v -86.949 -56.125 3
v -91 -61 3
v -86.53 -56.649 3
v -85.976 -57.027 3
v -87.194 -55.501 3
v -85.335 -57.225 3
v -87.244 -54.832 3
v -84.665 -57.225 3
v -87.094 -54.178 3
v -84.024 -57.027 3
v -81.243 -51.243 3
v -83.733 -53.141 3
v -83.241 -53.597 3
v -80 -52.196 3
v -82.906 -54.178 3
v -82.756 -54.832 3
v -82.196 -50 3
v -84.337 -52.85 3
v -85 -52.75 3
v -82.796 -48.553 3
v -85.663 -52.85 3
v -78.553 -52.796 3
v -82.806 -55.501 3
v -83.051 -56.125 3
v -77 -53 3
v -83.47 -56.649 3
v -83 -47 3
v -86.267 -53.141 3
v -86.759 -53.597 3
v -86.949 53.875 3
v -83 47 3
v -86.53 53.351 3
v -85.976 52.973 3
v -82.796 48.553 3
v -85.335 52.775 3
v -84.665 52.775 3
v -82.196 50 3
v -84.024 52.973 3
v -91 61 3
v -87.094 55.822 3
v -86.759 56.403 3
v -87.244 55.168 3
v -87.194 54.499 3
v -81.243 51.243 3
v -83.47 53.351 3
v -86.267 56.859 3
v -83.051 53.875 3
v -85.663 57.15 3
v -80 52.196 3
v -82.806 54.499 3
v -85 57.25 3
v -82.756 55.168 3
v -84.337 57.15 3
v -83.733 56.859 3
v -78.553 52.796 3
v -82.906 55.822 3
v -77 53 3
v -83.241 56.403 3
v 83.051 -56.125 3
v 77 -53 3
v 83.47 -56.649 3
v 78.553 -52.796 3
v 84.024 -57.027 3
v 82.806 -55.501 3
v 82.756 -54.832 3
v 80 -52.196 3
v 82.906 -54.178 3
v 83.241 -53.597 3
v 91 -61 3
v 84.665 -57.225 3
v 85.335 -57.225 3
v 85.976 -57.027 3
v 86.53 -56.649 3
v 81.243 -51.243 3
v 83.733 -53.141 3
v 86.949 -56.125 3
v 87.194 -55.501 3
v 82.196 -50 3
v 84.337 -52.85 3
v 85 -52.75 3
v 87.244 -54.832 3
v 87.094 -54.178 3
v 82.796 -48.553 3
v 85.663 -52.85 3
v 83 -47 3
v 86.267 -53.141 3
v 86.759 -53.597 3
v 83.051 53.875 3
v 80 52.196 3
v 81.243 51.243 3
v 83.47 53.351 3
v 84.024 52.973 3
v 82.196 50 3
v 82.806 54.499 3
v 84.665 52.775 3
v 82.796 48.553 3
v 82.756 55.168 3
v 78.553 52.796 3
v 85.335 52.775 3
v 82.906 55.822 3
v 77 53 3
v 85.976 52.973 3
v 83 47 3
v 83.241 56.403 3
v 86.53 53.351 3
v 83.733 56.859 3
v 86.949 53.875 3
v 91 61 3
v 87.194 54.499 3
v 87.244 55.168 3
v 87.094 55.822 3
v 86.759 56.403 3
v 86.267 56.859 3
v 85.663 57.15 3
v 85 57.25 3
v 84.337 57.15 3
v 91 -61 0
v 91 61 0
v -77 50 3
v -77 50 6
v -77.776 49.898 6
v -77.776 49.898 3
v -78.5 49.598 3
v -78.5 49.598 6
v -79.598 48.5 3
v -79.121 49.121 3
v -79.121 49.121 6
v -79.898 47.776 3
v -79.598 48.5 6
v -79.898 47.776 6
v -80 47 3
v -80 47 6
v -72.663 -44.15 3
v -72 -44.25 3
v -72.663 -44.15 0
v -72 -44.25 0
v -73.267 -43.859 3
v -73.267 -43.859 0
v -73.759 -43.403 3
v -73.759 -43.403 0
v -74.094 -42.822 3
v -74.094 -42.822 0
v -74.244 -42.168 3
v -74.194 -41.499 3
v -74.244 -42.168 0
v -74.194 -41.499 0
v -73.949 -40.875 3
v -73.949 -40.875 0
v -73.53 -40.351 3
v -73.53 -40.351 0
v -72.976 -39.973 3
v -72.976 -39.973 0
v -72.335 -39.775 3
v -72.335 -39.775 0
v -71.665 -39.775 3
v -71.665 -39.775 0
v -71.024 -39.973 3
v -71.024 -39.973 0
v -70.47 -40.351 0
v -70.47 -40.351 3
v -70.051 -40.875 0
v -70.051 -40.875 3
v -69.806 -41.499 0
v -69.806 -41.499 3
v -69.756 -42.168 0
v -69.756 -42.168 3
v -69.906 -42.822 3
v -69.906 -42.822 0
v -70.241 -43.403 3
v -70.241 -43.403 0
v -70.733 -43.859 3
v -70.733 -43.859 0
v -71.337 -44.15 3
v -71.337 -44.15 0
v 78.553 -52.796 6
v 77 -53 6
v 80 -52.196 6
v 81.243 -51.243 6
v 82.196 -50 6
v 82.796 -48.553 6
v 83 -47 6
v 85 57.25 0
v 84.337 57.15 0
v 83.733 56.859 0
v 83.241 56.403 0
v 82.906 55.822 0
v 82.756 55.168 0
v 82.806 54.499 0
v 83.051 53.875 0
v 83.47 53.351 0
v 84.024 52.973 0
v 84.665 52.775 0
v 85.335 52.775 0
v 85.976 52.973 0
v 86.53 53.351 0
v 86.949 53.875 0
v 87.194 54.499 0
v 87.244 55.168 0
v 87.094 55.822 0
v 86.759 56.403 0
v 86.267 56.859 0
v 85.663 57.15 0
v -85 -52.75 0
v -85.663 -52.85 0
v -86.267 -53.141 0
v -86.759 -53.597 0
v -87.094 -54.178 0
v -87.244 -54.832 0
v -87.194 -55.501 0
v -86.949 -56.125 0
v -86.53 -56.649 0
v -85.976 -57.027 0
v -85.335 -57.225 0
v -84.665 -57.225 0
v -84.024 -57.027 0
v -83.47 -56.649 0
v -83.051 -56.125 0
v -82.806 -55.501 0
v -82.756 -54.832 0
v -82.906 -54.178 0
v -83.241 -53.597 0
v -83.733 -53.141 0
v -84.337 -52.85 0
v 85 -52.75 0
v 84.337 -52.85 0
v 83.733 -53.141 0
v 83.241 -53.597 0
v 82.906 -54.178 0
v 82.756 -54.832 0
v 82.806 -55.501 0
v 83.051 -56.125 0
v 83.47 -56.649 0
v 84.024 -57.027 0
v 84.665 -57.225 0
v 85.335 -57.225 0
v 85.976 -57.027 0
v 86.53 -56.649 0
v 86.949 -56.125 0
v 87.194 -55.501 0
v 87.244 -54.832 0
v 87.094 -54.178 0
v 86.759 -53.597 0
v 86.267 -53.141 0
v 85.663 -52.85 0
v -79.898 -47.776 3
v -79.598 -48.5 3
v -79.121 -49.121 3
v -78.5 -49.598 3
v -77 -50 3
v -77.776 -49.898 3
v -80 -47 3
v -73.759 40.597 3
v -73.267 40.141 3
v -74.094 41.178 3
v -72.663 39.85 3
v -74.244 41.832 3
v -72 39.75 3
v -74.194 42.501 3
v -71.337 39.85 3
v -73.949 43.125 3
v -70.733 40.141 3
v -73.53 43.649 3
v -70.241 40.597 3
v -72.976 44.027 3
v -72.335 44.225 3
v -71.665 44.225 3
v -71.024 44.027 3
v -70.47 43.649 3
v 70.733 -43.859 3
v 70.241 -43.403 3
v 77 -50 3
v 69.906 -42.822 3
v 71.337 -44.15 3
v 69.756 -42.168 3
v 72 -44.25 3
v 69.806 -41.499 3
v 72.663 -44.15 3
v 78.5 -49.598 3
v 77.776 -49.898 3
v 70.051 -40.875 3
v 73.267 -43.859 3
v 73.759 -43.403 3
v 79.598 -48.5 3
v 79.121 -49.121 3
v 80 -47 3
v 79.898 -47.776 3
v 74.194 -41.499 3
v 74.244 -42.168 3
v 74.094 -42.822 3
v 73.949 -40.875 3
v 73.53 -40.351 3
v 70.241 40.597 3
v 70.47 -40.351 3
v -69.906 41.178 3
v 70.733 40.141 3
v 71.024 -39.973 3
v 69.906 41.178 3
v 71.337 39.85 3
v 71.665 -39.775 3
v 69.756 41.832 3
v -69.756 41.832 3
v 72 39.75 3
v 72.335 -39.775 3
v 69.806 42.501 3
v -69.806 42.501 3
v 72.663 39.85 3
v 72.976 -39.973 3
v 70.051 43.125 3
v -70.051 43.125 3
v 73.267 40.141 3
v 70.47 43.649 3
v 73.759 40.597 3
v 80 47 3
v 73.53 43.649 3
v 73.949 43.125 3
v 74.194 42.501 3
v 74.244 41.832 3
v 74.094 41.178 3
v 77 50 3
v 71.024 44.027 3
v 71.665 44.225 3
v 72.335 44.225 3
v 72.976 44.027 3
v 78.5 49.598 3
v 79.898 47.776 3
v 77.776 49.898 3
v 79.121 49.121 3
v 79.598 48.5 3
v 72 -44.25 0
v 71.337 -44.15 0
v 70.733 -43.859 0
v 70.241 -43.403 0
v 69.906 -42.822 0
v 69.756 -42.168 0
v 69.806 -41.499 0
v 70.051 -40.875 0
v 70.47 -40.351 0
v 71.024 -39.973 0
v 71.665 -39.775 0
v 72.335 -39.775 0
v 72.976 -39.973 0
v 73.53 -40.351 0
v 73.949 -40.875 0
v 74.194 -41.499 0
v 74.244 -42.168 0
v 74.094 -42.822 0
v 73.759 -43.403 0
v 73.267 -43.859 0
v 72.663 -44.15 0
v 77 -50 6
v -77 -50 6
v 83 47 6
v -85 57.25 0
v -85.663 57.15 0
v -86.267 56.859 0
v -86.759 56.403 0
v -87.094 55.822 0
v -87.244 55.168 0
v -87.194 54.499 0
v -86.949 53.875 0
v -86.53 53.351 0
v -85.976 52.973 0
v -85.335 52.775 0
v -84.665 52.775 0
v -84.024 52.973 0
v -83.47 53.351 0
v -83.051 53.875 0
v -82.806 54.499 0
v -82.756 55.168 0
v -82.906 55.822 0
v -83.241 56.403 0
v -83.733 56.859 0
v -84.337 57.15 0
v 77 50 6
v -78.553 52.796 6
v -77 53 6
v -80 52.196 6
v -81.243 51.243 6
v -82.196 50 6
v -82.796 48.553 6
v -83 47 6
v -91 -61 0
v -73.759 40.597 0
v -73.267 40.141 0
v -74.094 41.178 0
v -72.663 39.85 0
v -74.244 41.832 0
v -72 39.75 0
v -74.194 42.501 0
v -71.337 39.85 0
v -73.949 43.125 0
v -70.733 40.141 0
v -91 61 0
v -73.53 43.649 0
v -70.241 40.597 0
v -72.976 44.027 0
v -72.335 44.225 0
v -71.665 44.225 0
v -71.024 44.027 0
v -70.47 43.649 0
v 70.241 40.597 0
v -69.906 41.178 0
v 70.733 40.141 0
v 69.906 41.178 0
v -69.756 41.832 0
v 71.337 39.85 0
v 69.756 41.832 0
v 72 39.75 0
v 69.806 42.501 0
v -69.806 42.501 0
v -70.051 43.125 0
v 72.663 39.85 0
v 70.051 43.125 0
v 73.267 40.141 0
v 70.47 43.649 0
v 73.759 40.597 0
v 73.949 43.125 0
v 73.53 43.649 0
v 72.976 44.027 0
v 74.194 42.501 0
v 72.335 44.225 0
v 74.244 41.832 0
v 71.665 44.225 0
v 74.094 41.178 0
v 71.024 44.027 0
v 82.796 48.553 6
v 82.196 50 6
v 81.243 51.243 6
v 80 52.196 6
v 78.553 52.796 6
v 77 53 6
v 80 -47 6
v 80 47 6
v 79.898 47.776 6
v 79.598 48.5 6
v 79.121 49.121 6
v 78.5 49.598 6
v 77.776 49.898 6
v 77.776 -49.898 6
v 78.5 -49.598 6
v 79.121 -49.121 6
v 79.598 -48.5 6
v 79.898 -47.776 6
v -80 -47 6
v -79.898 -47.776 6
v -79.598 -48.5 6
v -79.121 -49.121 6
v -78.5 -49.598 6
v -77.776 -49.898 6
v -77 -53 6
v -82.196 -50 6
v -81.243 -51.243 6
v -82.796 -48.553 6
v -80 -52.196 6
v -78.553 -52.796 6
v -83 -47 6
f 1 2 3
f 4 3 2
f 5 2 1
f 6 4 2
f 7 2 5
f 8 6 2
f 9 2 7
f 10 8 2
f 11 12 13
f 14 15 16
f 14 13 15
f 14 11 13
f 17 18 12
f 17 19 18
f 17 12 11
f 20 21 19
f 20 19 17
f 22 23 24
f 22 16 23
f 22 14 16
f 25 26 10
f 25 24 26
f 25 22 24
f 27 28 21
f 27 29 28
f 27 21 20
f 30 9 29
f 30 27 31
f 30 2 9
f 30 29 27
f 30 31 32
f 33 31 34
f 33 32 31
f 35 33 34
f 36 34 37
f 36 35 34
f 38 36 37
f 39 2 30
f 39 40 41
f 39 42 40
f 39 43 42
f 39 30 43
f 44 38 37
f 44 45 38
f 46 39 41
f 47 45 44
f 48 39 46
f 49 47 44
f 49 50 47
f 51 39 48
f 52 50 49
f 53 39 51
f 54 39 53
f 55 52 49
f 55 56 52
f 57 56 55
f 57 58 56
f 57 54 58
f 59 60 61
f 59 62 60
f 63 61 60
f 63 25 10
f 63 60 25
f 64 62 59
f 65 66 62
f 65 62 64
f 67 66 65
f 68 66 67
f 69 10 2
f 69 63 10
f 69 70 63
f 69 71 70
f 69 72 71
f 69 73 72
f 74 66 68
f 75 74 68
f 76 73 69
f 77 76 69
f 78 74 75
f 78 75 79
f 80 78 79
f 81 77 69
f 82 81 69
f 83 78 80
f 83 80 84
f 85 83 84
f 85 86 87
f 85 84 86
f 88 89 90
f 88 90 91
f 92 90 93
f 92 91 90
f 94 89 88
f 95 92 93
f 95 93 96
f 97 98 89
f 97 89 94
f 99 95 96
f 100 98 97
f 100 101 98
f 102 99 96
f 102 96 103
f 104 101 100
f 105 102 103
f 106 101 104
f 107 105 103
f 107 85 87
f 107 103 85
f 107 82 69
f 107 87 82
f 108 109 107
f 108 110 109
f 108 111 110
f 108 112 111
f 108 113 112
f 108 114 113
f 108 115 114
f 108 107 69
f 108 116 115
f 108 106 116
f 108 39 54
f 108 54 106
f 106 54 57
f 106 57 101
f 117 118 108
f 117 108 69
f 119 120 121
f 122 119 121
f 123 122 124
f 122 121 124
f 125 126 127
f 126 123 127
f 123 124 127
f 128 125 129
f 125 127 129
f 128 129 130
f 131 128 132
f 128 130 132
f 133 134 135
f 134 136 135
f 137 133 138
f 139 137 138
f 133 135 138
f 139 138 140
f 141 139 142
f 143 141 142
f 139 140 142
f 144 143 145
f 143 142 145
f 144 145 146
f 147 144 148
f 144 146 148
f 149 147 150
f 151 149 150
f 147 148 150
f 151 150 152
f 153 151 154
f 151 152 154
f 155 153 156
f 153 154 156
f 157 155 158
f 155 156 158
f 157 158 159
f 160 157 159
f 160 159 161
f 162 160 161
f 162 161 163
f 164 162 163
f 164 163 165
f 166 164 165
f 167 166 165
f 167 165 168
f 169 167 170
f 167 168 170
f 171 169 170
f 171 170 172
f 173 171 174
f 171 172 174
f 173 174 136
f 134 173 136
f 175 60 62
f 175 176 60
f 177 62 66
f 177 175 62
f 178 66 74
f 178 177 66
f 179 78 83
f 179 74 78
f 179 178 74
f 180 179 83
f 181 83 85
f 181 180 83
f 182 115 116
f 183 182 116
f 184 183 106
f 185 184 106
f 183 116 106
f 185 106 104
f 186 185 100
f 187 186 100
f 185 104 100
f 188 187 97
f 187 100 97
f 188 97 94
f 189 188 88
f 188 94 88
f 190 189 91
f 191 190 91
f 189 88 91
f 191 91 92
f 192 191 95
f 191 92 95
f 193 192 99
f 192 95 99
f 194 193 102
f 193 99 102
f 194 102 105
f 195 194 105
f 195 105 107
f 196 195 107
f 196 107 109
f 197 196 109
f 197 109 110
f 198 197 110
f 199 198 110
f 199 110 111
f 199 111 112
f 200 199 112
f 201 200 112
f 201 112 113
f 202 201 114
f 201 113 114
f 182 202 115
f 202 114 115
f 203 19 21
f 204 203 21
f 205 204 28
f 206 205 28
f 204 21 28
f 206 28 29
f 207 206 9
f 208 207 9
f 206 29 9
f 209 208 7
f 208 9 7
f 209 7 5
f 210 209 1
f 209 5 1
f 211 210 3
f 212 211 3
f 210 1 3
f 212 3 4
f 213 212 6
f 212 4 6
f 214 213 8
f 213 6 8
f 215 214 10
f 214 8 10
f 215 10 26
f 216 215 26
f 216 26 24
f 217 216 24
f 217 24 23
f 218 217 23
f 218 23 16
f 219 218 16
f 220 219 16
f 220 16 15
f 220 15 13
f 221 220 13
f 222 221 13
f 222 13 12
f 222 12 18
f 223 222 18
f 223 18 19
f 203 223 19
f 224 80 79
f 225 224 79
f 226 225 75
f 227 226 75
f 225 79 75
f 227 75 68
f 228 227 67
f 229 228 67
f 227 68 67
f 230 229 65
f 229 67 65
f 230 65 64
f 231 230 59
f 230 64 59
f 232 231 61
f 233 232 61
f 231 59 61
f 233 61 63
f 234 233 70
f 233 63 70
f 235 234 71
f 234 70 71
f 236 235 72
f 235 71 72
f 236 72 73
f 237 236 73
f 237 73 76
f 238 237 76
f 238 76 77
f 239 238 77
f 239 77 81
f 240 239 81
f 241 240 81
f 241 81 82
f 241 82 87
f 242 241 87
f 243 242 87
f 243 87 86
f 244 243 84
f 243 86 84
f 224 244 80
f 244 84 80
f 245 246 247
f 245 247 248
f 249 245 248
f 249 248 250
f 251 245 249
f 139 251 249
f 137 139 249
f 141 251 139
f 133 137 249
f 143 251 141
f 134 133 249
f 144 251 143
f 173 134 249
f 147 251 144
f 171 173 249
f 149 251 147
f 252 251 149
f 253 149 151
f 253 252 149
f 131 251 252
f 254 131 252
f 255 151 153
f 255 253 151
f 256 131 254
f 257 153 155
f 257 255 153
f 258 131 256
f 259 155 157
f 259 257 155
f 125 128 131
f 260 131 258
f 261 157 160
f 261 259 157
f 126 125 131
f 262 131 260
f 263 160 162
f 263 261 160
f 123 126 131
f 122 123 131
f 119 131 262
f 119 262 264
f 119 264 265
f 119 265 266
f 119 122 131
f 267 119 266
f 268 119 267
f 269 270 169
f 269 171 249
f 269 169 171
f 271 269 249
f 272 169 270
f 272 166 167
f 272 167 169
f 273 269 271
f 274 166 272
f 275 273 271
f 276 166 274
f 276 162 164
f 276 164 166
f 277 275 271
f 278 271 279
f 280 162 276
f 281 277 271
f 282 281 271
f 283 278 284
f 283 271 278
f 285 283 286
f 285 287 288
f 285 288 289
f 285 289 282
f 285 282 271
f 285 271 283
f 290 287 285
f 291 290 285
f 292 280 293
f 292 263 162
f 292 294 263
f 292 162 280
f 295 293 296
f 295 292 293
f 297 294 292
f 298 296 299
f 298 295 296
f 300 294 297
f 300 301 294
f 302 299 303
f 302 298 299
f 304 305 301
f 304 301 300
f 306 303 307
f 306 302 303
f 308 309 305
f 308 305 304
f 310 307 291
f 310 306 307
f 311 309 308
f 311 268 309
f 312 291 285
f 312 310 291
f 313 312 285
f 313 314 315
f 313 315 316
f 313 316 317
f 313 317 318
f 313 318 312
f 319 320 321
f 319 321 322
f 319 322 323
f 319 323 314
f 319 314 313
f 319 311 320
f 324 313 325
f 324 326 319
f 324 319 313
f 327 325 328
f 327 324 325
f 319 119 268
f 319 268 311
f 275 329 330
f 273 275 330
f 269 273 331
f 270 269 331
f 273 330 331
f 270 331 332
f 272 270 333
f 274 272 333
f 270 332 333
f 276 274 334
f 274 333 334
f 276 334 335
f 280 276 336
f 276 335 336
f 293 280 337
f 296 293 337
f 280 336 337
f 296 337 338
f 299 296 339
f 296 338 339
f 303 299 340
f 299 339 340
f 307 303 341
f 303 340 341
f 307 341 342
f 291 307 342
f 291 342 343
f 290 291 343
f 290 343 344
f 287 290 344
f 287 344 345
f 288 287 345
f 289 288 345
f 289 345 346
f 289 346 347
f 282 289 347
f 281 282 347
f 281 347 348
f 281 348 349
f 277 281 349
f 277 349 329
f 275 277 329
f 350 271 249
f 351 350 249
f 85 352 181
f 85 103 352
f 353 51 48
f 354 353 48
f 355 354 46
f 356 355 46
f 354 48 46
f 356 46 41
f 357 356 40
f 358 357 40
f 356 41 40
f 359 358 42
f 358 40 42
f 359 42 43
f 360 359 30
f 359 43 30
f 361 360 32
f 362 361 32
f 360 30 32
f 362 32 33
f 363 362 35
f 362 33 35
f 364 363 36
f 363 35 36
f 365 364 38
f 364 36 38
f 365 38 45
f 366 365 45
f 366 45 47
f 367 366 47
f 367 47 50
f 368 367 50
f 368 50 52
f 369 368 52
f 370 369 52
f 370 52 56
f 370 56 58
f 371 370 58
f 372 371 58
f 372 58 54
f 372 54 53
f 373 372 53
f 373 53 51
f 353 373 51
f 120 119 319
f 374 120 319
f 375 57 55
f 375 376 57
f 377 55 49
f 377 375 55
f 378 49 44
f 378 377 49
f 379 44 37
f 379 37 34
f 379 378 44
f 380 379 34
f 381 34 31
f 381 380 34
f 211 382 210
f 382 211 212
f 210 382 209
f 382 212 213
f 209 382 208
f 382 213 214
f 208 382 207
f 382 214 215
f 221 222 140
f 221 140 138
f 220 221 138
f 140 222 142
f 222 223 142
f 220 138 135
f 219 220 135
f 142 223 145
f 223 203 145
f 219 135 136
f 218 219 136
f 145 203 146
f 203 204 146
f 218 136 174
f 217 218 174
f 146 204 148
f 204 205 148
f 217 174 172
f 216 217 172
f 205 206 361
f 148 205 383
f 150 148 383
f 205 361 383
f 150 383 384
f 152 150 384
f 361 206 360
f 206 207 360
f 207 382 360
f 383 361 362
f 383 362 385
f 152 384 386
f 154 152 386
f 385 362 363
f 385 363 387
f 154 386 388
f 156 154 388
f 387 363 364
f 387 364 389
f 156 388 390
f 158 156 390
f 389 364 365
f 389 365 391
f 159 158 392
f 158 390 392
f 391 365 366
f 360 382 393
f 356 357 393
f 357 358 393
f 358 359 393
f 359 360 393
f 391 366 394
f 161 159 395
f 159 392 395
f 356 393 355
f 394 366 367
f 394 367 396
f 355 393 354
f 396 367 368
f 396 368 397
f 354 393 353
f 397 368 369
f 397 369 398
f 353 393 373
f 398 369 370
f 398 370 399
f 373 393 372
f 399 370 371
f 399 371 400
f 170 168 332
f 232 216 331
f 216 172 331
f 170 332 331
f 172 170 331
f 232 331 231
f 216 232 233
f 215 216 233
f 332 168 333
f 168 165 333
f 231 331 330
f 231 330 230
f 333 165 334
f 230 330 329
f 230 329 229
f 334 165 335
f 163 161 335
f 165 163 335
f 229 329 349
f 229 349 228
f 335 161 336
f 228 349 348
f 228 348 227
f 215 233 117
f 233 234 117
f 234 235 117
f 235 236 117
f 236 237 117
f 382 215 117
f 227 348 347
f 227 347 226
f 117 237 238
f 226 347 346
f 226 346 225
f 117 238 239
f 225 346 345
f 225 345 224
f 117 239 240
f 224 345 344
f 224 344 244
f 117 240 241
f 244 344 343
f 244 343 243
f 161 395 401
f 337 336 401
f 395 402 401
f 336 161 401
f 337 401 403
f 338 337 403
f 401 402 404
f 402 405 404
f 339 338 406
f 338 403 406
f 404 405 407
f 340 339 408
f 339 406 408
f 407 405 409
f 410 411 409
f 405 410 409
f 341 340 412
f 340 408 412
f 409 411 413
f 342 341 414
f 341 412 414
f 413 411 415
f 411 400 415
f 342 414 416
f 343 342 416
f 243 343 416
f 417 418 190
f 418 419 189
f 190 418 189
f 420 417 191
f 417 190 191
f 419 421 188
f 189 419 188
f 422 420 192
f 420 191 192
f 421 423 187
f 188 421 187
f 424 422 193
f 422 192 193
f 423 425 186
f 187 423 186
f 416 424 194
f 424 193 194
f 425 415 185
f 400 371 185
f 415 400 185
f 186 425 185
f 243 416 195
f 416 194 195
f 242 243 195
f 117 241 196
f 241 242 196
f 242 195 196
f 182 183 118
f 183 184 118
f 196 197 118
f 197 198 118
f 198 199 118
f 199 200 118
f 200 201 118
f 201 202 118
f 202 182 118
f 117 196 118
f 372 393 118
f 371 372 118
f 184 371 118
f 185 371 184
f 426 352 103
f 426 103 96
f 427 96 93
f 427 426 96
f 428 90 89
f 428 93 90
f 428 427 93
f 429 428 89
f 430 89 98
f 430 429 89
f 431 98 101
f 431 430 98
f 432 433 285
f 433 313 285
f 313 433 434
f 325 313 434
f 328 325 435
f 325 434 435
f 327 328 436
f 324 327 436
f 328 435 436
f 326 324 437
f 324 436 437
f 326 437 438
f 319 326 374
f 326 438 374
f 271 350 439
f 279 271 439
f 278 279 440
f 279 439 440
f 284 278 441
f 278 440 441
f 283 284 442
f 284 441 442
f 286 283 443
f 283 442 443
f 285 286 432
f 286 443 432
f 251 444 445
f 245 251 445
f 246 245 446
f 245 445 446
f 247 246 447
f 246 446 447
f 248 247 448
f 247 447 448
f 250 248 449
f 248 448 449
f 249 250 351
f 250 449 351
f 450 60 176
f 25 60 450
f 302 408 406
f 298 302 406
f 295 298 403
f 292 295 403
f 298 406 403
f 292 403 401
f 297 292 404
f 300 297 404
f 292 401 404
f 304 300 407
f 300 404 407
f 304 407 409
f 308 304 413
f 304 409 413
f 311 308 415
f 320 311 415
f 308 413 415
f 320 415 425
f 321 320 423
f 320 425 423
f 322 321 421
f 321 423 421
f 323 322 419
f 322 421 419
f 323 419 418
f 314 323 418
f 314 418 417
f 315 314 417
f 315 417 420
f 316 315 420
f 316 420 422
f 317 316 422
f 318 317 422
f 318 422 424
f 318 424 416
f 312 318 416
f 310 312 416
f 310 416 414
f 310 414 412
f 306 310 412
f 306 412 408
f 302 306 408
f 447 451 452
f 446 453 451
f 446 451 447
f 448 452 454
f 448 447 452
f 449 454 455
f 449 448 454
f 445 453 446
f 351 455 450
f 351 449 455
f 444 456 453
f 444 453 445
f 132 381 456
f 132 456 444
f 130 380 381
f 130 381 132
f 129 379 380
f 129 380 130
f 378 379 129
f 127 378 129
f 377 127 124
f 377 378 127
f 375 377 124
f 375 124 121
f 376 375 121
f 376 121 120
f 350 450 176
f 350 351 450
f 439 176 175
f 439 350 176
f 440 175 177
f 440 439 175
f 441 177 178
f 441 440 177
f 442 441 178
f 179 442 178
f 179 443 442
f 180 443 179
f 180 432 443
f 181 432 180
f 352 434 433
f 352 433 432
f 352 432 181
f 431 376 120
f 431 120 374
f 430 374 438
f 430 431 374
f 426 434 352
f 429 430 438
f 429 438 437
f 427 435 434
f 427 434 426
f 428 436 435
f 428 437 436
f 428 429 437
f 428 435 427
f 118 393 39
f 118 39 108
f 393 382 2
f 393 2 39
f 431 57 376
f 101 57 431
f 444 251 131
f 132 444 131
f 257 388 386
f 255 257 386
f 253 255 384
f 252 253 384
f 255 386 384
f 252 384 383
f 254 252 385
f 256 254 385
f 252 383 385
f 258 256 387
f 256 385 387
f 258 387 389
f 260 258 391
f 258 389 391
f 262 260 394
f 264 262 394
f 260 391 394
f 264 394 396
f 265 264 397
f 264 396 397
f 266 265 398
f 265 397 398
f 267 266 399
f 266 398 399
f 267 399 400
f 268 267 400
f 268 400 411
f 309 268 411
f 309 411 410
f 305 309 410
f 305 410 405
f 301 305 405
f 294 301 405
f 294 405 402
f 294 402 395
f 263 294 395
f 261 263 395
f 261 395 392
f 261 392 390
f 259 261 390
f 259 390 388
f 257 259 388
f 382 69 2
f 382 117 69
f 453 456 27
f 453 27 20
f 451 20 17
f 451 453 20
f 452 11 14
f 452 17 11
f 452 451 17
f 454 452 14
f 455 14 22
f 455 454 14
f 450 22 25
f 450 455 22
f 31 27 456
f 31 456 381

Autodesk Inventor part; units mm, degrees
ref_plane "YZ Plane" through (0, 0, 0) normal (1, 0, 0) x (0, 1, 0)
ref_plane "XZ Plane" through (0, 0, 0) normal (0, 1, 0) x (-1, 0, 0)
ref_plane "XY Plane" through (0, 0, 0) normal (0, 0, 1) x (1, 0, 0)
sketch "Sketch1" plane through (0, 0, 0) normal (0, 0, 1) x (1, 0, 0)
  line L0 (-83, 53) -> (83, 53) construction
  line L1 (83, 53) -> (83, -53) construction
  line L2 (83, -53) -> (-83, -53) construction
  line L3 (-83, -53) -> (-83, 53) construction
  line L4 (-83, 53) -> (83, -53) construction
  line L5 (83, 53) -> (-83, -53) construction
  line L6 (-91, 61) -> (91, 61)
  line L7 (91, 61) -> (91, -61)
  line L8 (91, -61) -> (-91, -61)
  line L9 (-91, -61) -> (-91, 61)
  line L10 (-91, 61) -> (91, -61) construction
  line L11 (-91, -61) -> (91, 61) construction
  point P0 (0, 0)
  point P1 (0, 0)
  point P2 (0, 0)
  dimension "d0" = 166
  dimension "d1" = 106
  dimension "d2" = 8
  dimension "d3" = 8
extrude "Extrusion1" add sketch "Sketch1" along normal blind 3
sketch "Sketch2" plane through (0, 0, 3) normal (0, 0, 1) x (1, 0, 0)
  line L0 (-83, 53) -> (83, 53)
  line L1 (83, 53) -> (83, -53)
  line L2 (83, -53) -> (-83, -53)
  line L3 (-83, -53) -> (-83, 53)
  line L4 (-83, 53) -> (83, -53) construction
  line L5 (83, 53) -> (-83, -53) construction
  line L6 (-80, 50) -> (80, 50)
  line L7 (80, 50) -> (80, -50)
  line L8 (80, -50) -> (-80, -50)
  line L9 (-80, -50) -> (-80, 50)
  line L10 (-80, -50) -> (80, 50) construction
  line L11 (80, -50) -> (-80, 50) construction
  point P0 (0, 0)
  point P1 (0, 0)
  point P2 (0, 0)
  dimension "d6" = 166
  dimension "d7" = 106
  dimension "d8" = 3
  dimension "d9" = 3
extrude "Extrusion2" add sketch "Sketch2" along normal blind 3
fillet "Fillet1" radius 3 4 edges at (80, 50, 4.5) (80, -50, 4.5) (-80, -50, 4.5) (-80, 50, 4.5)
fillet "Fillet2" radius 6 4 edges at (83, 53, 4.5) (83, -53, 4.5) (-83, -53, 4.5) (-83, 53, 4.5)
sketch "Sketch3" plane through (0, 0, 0) normal (0, 0, -1) x (-1, 0, 0)
  line L0 (91, 61) -> (-91, 61) projected
  line L1 (-91, 61) -> (-91, -61) projected
  line L2 (91, -61) -> (91, 61) projected
  circle A0 centre (-85, 55) radius 2
  line L3 (0, 0) -> (-15.5328, 0) construction
  line L4 (0, 0) -> (0, 8.2904) construction
  circle A1 centre (-85, -55) radius 2
  circle A2 centre (85, 55) radius 2
  circle A3 centre (85, -55) radius 2
  dimension "d14" = 4
  dimension "d15" = 6
  dimension "d16" = 6
hole "Hole1" at (85, 55, 0) at (85, -55, 0) at (-85, -55, 0) at (-85, 55, 0) direction (0, 0, 1) diameter 4.5 depth 8 tip angle 118 clearance for "Flat Head Machine Screw" size "M4" standard "Ansi Metric M Profile"
sketch "Sketch4" plane through (0, 0, 3) normal (0, 0, 1) x (1, 0, 0)
  line L0 (-80, 47) -> (-80, -47) projected
  line L1 (-77, -50) -> (77, -50) projected
  line L2 (77, 50) -> (-77, 50) projected
  line L3 (0, 0) -> (-11.513, 0) construction
  line L4 (0, 0) -> (0, -7.6384) construction
  circle A0 centre (-72, -42) radius 5.1497
  circle A1 centre (-72, 42) radius 5.1497
  circle A2 centre (72, -42) radius 5.1497
  circle A3 centre (72, 42) radius 5.1497
  dimension "d24" = 8
  dimension "d25" = 8
hole "Hole2" at (-72, -42, 3) at (-72, 42, 3) at (72, -42, 3) at (72, 42, 3) direction (0, 0, -1) diameter 4.5 depth 8 tip angle 118 clearance for "Flat Head Machine Screw" size "M4" standard "Ansi Metric M Profile"
sketch "Sketch5" plane through (0, 0, 3) normal (0, 0, 1) x (1, 0, 0)
  circle A0 centre (72, 42) radius 2.25 projected
  circle A1 centre (72, -42) radius 2.25 projected
  circle A2 centre (-72, 42) radius 2.25 projected
  circle A3 centre (-72, -42) radius 2.25 projected
  arc A4 (-77, 50) -> (-80, 47) centre (-77, 47) ccw projected
  line L0 (-80, 47) -> (-80, -47) projected
  arc A5 (-80, -47) -> (-77, -50) centre (-77, -47) ccw projected
  line L1 (-77, -50) -> (77, -50) projected
  arc A6 (77, -50) -> (80, -47) centre (77, -47) ccw projected
  line L2 (80, -47) -> (80, 47) projected
  arc A7 (80, 47) -> (77, 50) centre (77, 47) ccw projected
  line L3 (77, 50) -> (-77, 50) projected
  circle A8 centre (-25, -40) radius 0.5
  circle A9 centre (-40, -15) radius 0.5
  circle A10 centre (-45, 5) radius 0.5
  circle A11 centre (-45, 20) radius 0.5
  circle A12 centre (35, -40) radius 0.5
  circle A13 centre (25, 25) radius 0.5
  circle A14 centre (25, 40) radius 0.5
  point P0 (0, 0)
  dimension "d33" = 1
  dimension "d34" = 1
  dimension "d35" = 1
  dimension "d36" = 1
  dimension "d37" = 1
  dimension "d38" = 1
  dimension "d39" = 1
  dimension "d41" = 55
  dimension "d43" = 40
  dimension "d44" = 35
  dimension "d45" = 35
  dimension "d50" = 55
  dimension "d51" = 55
  dimension "d53" = 45
  dimension "d54" = 30
  dimension "d55" = 45
  dimension "d56" = 35
  dimension "d57" = 10
  dimension "d58" = 10
  dimension "d59" = 25
  dimension "d60" = 10
equation "\"d15\" = 1.5 * d14"
equation "\"d16\" = 1.5 * d14"
properties part number "Base.Box.Lid"
